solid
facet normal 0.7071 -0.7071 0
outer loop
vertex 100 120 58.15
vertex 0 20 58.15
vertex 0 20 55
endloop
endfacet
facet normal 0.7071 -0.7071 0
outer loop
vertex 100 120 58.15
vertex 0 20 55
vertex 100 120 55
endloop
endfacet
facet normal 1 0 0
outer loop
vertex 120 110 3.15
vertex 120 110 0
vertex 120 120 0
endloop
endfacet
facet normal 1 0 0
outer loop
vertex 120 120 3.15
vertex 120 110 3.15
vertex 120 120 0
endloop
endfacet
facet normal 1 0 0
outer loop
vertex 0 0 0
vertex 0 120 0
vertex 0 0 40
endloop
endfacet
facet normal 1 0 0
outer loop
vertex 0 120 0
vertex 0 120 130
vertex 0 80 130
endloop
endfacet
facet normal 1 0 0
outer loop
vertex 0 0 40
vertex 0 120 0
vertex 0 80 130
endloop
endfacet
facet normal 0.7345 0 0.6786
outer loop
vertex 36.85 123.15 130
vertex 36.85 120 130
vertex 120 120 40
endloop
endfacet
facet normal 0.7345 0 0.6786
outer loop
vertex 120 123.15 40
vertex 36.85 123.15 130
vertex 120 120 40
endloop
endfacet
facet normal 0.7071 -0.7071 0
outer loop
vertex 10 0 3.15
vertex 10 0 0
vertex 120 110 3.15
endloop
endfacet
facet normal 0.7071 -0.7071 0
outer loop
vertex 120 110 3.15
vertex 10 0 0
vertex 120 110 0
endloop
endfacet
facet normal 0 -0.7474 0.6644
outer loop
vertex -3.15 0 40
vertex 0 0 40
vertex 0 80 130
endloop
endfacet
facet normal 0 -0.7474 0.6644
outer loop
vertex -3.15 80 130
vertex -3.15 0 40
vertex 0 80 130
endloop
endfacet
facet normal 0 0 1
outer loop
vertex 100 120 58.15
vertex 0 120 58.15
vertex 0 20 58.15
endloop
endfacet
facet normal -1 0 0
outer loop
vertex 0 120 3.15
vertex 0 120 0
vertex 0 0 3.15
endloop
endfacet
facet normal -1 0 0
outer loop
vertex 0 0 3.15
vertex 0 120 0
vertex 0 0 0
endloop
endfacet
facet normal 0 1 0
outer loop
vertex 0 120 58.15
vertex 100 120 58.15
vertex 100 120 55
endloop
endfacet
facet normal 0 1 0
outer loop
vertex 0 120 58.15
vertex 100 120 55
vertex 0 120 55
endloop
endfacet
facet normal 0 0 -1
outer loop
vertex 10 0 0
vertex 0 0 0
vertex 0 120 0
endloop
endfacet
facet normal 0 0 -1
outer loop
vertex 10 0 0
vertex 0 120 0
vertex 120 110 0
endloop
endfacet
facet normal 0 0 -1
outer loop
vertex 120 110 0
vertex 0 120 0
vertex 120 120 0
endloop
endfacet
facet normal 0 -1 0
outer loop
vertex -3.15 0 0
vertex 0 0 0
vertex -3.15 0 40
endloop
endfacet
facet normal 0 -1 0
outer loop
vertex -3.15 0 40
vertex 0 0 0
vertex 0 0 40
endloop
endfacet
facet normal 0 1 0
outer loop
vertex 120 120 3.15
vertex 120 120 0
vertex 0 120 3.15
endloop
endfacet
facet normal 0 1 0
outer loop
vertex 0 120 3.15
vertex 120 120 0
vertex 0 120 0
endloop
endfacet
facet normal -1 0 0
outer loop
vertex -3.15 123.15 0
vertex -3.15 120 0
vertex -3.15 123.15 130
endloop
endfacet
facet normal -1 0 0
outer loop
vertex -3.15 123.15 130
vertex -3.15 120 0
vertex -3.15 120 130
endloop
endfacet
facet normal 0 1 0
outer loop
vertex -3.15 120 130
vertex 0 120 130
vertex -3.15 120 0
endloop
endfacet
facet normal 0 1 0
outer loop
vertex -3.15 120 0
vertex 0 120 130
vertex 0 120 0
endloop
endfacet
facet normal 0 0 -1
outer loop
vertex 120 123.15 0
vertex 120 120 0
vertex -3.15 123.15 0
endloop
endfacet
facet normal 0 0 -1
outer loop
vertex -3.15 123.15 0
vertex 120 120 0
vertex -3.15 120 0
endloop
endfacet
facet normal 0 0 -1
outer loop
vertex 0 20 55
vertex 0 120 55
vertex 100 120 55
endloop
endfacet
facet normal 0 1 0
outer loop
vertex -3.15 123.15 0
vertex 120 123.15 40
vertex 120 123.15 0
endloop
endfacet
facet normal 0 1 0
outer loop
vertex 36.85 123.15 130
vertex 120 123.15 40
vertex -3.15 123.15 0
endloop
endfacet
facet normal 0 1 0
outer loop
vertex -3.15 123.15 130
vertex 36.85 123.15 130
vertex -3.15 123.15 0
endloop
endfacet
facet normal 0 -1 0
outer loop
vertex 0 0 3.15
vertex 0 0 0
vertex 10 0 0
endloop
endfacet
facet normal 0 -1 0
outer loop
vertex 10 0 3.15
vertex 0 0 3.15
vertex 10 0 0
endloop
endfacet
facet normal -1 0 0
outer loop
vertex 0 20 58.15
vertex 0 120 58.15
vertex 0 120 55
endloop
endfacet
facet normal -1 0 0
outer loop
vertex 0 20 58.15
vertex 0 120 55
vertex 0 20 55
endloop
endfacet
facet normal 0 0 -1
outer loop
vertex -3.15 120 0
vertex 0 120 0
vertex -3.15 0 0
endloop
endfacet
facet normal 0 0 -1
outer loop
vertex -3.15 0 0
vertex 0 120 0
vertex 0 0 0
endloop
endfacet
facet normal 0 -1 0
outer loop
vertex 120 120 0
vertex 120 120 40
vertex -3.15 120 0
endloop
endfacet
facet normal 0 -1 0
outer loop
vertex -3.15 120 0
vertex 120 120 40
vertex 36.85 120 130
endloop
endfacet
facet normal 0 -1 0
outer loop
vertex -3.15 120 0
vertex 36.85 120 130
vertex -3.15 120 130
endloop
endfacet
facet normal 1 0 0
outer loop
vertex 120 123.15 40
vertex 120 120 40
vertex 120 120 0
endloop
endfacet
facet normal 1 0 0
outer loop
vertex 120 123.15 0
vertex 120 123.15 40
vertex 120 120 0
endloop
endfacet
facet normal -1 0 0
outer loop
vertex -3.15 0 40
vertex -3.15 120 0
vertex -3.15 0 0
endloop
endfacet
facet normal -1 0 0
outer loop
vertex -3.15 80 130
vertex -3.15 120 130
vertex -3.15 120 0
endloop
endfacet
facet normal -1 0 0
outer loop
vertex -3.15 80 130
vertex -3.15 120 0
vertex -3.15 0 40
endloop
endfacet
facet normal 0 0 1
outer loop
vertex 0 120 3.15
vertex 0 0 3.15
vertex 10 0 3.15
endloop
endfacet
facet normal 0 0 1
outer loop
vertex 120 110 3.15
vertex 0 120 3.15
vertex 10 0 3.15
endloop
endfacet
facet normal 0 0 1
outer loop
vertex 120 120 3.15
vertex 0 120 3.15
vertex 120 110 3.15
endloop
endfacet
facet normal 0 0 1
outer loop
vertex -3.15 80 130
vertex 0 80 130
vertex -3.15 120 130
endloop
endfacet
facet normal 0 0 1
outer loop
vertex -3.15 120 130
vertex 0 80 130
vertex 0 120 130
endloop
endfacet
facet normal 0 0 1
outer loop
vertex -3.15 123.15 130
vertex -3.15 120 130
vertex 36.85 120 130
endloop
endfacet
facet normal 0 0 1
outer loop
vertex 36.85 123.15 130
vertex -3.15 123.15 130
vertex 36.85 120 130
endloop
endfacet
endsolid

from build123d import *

# Parameters (mm, degrees)
F2_DEPTH = 3.15
F4_DEPTH = 3.15
F6_DEPTH = 3.15
F9_DEPTH = 3.15


with BuildPart() as f2:
    # F1 (on Top) → F2 (new body)
    with BuildSketch(Plane.XY):
        Polygon((0, 120), (0, 0), (10, 0), (120, 110), (120, 120), align=None)
    extrude(amount=F2_DEPTH)


with BuildPart() as f4:
    # F3 (on face) → F4 (new body)
    with BuildSketch(Plane(origin=(0, 0, 0), x_dir=(0, -1, 0), z_dir=(-1, 0, 0))):
        Polygon((0, 40), (-80, 130), (-120, 130), (-120, 0), (0, 0), align=None)
    extrude(amount=F4_DEPTH)


with BuildPart() as f6:
    # F5 (on face) → F6 (new body)
    with BuildSketch(Plane(origin=(0, 120, 0), x_dir=(-1, 0, 0), z_dir=(0, 1, 0))):
        Polygon((-120, 40), (-120, 0), (3.15, 0), (3.15, 130), (-36.85, 130), align=None)
    extrude(amount=F6_DEPTH)


with BuildPart() as f9:
    # F8 (on offset) → F9 (new body)
    with BuildSketch(Plane.XY.offset(58.15)):
        Polygon((0, 120), (0, 20), (100, 120), align=None)
    extrude(amount=-F9_DEPTH)


solid = Compound([f2.part, f4.part, f6.part, f9.part])
